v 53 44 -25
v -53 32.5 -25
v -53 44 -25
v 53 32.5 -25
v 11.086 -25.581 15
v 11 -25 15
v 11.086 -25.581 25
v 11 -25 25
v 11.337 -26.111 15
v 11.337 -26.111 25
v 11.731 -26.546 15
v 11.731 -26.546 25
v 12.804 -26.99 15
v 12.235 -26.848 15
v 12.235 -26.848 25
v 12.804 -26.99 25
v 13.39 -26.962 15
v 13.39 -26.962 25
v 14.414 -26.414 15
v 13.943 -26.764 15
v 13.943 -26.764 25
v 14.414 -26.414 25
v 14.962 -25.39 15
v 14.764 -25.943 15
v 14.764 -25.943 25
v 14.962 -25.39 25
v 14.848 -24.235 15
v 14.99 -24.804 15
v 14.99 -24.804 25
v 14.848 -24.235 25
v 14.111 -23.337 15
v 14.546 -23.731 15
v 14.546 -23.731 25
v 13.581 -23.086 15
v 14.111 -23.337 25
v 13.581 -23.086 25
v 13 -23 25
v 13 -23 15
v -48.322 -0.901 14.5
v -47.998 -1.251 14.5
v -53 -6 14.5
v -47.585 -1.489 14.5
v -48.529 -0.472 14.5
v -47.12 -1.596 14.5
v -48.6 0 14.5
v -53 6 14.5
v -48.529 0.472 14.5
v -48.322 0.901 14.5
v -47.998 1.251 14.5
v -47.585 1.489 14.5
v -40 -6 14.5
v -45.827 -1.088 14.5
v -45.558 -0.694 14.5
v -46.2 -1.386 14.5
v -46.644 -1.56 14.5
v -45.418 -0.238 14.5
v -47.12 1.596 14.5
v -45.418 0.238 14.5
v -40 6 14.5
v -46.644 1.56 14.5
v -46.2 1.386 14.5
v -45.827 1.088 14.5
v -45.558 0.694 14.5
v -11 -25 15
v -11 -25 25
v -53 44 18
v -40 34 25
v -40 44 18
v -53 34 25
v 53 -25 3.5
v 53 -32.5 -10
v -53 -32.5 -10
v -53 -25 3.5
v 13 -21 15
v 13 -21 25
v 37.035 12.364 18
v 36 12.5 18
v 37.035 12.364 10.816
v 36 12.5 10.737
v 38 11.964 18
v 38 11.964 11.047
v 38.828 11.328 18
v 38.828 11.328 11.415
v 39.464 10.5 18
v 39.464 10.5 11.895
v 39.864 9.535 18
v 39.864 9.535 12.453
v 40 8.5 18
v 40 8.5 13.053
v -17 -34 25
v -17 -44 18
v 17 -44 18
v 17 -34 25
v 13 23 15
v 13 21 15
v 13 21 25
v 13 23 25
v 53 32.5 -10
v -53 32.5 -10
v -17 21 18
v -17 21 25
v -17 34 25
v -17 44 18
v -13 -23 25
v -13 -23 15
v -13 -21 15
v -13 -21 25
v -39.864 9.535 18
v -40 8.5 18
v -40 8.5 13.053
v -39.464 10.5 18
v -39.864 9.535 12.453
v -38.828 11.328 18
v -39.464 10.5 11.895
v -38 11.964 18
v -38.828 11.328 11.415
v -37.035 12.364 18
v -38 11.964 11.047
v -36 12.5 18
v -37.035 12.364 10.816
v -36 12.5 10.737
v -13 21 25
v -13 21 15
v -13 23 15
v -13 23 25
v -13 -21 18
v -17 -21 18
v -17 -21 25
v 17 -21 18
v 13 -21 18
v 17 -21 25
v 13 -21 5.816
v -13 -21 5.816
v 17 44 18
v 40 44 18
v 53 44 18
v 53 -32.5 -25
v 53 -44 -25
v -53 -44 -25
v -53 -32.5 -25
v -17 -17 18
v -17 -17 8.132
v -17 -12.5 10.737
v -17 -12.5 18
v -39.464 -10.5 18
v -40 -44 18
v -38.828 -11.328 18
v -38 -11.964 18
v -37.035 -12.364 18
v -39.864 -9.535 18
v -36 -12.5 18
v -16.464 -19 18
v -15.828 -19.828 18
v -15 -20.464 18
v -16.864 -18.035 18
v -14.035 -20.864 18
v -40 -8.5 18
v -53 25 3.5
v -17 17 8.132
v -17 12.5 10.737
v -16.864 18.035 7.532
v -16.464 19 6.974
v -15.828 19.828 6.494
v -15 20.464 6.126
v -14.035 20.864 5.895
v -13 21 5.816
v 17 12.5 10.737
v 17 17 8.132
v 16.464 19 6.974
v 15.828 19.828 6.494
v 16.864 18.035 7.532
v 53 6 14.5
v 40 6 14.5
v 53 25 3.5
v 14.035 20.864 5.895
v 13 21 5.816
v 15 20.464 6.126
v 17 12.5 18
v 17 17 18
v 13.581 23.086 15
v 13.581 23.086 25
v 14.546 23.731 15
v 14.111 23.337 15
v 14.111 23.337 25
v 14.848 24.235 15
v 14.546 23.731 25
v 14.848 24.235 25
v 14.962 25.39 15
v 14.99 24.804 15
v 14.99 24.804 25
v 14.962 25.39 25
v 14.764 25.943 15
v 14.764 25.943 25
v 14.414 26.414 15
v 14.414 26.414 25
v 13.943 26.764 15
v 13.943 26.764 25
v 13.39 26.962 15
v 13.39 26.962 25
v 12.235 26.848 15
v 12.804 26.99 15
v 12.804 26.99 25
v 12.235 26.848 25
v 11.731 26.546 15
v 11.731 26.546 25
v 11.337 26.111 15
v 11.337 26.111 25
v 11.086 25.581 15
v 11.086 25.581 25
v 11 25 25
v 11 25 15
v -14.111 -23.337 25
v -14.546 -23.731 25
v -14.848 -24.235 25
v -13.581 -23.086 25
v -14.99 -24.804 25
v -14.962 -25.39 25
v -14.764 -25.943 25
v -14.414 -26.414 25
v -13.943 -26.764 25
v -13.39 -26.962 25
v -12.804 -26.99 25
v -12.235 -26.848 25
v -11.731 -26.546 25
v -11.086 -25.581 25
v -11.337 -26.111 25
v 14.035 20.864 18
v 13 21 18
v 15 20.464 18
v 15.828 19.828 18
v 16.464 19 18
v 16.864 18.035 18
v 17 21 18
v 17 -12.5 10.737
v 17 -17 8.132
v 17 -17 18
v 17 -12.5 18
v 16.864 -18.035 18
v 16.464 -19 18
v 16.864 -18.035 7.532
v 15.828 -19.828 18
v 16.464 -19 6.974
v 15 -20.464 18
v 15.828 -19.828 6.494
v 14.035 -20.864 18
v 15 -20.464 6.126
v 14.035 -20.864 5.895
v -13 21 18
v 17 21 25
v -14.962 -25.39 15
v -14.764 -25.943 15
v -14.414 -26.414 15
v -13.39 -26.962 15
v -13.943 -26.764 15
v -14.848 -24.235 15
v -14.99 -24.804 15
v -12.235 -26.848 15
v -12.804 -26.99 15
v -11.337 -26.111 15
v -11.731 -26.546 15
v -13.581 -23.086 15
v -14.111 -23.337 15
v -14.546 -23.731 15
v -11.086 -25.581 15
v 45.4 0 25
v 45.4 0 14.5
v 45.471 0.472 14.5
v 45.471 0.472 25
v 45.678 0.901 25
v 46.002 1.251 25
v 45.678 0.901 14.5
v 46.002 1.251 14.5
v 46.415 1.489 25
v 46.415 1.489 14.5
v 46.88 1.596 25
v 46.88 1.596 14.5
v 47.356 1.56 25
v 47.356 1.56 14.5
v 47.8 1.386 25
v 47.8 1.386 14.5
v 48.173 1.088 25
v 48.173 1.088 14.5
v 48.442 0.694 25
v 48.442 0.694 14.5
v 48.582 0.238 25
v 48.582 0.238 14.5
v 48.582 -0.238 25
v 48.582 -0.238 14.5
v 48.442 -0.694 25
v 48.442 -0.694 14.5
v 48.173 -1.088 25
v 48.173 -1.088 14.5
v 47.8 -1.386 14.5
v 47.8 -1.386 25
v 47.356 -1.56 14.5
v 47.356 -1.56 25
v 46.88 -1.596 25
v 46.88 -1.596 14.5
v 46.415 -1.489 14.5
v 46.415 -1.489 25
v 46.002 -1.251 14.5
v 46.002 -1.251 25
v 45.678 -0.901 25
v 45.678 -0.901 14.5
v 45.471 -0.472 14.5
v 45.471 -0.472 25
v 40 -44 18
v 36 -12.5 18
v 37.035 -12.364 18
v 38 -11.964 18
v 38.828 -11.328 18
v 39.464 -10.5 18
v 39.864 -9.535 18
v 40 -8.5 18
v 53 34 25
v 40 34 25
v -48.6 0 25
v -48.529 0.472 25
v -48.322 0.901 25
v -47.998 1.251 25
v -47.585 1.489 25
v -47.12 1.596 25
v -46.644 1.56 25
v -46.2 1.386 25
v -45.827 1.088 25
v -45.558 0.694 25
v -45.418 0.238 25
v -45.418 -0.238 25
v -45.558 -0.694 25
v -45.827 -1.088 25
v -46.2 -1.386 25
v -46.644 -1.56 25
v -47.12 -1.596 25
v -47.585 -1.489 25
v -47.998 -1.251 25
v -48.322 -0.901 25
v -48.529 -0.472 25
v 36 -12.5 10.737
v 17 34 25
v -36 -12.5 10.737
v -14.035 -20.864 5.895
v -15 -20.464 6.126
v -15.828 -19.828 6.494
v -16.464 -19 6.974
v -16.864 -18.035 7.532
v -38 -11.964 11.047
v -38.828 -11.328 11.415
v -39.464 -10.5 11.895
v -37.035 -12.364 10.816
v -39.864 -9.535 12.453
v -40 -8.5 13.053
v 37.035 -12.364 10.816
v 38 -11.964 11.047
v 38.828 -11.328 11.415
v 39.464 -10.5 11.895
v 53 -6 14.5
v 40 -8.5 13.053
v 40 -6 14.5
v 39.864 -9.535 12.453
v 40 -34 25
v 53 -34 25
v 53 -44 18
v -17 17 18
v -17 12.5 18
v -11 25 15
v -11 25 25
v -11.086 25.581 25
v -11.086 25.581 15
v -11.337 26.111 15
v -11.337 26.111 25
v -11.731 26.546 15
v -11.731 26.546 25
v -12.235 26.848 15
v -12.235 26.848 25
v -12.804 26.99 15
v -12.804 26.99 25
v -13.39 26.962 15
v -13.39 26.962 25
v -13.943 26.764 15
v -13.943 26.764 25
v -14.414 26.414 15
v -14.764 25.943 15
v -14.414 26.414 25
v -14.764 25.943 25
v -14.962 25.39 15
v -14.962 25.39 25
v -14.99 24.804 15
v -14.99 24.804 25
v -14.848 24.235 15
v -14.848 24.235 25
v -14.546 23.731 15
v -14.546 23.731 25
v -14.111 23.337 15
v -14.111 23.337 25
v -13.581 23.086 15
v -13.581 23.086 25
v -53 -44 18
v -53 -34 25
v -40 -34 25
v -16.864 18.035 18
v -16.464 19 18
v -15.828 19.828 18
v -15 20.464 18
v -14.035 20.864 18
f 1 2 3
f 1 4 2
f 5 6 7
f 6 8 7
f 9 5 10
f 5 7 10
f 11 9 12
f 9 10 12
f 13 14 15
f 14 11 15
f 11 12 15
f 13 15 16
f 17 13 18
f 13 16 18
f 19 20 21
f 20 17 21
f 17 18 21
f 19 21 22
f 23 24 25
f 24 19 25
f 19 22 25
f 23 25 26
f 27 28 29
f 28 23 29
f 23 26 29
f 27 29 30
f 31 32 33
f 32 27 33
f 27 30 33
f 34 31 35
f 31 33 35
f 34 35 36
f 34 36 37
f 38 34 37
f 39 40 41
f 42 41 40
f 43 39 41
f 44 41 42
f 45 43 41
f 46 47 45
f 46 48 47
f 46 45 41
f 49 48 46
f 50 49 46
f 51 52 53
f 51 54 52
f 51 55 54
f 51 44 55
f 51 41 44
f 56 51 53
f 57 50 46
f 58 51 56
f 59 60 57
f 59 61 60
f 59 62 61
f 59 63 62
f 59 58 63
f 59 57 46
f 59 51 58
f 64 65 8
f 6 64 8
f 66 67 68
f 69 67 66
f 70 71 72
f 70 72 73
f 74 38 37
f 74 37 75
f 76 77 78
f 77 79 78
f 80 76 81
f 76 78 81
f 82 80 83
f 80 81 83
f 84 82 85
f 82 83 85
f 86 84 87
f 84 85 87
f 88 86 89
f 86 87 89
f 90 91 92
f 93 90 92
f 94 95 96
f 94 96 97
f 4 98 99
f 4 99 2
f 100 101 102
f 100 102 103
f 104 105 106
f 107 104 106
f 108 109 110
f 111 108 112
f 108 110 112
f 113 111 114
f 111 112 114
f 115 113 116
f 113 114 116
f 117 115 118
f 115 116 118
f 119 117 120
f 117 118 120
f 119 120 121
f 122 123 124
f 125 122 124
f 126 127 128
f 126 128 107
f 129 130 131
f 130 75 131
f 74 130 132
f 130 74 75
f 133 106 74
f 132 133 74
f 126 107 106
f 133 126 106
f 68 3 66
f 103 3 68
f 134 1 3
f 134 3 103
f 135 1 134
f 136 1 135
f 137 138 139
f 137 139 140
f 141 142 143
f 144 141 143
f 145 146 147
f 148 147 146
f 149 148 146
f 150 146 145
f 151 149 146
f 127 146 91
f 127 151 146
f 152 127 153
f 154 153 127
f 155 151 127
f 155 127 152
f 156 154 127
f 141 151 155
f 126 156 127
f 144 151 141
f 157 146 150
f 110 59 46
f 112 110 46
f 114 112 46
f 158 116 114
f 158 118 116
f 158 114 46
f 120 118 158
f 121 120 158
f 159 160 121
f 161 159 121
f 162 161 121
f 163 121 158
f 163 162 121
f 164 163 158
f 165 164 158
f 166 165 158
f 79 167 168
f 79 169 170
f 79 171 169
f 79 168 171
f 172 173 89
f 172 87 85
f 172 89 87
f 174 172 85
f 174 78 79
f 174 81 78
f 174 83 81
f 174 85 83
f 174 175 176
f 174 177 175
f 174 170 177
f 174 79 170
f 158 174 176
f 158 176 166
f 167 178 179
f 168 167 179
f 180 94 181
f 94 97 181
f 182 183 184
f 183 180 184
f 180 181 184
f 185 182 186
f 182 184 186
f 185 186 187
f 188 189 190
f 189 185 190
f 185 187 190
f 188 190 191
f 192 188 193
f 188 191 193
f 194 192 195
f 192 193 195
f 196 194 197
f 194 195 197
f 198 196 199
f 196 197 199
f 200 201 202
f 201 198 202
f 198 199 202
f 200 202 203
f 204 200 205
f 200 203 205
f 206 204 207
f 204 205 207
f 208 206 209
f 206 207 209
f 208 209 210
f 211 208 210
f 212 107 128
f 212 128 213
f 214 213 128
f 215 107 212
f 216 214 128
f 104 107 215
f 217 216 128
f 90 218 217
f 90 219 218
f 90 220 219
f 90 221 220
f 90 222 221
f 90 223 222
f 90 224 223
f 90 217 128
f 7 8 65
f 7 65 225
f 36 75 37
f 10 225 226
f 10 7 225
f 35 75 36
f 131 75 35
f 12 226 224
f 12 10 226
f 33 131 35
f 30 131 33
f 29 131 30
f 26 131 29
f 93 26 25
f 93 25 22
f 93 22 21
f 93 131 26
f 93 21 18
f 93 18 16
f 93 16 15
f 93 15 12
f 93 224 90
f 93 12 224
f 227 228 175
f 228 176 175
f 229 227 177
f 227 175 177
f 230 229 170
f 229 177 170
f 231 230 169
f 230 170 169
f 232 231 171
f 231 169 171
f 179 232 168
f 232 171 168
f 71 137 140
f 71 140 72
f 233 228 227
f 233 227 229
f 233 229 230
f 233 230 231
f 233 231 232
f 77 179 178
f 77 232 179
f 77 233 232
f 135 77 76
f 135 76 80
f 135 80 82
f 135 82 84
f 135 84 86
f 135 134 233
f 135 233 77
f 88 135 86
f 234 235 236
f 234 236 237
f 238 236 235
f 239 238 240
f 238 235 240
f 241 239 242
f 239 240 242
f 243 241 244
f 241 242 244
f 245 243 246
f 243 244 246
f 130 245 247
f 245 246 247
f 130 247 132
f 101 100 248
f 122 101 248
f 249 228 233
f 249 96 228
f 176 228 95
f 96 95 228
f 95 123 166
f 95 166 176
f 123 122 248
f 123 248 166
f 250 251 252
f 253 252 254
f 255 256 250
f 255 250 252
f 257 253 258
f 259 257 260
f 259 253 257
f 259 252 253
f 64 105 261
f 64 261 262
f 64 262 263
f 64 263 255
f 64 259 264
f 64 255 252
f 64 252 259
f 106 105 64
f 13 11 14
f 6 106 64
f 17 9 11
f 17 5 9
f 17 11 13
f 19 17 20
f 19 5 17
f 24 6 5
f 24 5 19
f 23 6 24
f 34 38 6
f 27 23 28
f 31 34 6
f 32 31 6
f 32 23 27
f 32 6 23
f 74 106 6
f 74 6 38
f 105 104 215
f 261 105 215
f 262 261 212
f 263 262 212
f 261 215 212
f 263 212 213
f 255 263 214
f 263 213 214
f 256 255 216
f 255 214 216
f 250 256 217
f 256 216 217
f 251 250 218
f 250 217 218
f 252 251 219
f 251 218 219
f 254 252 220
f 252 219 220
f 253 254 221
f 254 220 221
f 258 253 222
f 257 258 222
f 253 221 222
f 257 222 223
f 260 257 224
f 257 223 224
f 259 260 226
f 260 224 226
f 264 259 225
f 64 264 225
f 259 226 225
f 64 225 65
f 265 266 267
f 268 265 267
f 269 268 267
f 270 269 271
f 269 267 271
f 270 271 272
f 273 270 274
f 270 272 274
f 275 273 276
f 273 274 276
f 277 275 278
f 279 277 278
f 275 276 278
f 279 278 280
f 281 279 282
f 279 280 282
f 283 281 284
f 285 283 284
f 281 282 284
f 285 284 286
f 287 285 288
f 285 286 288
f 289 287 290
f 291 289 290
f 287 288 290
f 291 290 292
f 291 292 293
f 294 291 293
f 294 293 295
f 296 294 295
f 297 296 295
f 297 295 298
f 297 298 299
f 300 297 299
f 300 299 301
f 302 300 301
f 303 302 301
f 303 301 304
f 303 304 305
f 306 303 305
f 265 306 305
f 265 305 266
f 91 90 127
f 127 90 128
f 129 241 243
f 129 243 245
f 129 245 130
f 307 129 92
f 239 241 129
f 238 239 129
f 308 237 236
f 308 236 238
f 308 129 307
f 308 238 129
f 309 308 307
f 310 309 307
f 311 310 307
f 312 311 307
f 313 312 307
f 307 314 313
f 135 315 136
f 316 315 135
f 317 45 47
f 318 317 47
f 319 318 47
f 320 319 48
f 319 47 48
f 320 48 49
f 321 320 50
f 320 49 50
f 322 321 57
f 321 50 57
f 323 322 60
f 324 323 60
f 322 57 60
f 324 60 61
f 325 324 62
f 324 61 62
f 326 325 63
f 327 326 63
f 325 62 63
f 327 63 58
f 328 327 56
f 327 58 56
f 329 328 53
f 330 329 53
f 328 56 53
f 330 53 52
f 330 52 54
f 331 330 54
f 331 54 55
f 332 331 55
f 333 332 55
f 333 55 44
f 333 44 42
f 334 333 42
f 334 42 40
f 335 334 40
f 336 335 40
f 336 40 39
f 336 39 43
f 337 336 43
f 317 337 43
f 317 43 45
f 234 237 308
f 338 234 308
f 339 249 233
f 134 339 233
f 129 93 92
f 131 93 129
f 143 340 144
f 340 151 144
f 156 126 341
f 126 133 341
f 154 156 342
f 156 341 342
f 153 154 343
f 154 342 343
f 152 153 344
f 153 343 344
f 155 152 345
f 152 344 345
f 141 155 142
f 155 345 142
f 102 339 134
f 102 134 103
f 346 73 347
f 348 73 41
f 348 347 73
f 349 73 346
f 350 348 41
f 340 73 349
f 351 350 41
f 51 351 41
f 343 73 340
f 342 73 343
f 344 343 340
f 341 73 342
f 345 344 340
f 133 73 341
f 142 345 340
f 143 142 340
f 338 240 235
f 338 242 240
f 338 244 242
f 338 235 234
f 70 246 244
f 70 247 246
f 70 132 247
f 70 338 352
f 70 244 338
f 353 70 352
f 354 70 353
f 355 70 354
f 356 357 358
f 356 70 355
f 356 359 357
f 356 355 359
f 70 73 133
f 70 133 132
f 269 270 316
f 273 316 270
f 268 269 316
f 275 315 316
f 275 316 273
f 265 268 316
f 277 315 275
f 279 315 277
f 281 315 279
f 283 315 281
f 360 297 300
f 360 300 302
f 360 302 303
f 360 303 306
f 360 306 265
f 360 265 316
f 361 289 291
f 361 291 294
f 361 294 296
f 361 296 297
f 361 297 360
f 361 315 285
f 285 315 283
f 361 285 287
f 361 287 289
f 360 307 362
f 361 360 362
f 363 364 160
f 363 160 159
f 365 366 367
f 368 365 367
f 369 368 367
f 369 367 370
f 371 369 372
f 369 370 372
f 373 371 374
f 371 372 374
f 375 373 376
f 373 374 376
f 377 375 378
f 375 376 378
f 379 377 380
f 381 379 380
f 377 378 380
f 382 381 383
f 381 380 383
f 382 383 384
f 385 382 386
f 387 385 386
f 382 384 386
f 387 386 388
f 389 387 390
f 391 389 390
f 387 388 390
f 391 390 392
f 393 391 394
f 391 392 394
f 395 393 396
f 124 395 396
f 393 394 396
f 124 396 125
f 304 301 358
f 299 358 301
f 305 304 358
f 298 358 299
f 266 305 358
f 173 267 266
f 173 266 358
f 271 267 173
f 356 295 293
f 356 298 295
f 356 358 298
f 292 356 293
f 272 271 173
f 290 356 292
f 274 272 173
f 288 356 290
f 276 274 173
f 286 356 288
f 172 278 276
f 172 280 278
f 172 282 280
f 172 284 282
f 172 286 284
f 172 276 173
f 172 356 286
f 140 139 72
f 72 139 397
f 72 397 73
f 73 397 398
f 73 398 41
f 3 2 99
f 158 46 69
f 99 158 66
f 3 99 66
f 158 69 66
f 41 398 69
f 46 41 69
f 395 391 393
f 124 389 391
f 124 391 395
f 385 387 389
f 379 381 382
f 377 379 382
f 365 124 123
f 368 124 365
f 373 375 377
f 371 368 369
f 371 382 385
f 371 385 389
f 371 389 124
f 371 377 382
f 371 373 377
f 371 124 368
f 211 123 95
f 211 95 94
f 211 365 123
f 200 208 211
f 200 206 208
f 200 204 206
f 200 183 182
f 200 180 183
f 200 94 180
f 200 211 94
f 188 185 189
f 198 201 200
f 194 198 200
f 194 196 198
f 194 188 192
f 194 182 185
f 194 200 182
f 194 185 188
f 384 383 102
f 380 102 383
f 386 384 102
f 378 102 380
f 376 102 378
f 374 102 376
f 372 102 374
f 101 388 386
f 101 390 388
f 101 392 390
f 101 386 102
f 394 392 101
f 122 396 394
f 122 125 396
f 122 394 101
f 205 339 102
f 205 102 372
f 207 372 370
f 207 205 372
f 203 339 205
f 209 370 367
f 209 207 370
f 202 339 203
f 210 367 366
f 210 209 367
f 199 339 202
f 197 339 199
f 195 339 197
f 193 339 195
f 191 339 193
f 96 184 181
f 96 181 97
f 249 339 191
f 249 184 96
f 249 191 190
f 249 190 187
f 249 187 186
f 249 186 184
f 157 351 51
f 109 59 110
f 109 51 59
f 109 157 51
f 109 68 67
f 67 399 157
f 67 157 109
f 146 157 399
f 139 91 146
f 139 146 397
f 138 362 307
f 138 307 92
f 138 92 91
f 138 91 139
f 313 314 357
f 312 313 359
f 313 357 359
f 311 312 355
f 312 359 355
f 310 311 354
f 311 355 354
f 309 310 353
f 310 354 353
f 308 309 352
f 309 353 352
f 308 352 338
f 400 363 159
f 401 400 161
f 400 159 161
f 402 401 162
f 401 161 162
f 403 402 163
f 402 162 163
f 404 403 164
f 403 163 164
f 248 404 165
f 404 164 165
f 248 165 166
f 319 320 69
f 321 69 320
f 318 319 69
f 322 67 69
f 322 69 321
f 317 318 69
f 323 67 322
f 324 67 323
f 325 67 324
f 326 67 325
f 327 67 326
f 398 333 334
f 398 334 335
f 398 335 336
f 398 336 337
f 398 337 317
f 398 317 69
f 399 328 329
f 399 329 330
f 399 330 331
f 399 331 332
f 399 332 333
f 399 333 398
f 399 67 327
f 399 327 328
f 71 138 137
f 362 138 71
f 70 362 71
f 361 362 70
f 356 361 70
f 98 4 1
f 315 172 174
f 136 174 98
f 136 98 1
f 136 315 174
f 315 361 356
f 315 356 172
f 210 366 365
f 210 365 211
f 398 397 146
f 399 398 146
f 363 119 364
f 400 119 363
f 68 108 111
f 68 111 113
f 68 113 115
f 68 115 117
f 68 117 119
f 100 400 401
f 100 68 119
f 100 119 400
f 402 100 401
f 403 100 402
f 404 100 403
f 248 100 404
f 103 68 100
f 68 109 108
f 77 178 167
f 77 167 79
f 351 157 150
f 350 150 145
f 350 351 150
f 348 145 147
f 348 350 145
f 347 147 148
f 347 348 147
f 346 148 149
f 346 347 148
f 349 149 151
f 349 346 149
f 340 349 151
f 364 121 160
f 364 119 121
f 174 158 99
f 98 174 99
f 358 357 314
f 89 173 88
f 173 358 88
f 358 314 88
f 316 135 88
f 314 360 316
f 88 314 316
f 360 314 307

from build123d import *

# Parameters (mm, degrees)
F1_DEPTH  = 53
F2_W      = 80
F2_H      = 25
F3_DEPTH  = 25
F4_W      = 23
F4_H      = 115.9437634051
F5_DEPTH  = 7
F6_W      = 34
F6_H      = 8.5
F7_DEPTH  = 50.001
F8_W      = 26
F8_H      = 4
F9_DEPTH  = 10
F10_R     = 2
F11_DEPTH = 10
F12_SIZE2 = 7
F12_SIZE  = 10
F13_SIZE2 = 10
F13_SIZE  = 7
F15_D     = 3.2
F15_DEPTH = 12
F15_TIP   = 0.9613769904
F16_R     = 3.99999


# Not quite as in the source:
# - a fillet or chamfer is up to 0.001 mm smaller than in the source, because OpenCascade refuses the exact size


with BuildPart() as f1:
    # F0 (on Right) → F1 (new body, symmetric)
    with BuildSketch(Plane.YZ):
        Polygon((44, 25), (-44, 25), (-44, -25), (-32.5, -25), (-32.5, -10), (-25, 3.5), (-6, 14.5), (0, 14.5), (6, 14.5), (25, 3.5), (32.5, -10), (32.5, -25), (44, -25), align=None)
    extrude(amount=F1_DEPTH, both=True)

    # F2 (on face) → F3 (cut)
    with BuildSketch(Plane.XY.offset(25)):
        Rectangle(F2_W, F2_H)
    extrude(amount=-F3_DEPTH, mode=Mode.SUBTRACT)

    # F4 (on face) → F5 (cut)
    with BuildSketch(Plane.XY.offset(25)):
        with Locations((-28.5, -2.7361307293)):
            Rectangle(F4_W, F4_H)
        with Locations((28.5, -2.7361307293)):
            Rectangle(F4_W, F4_H)
    extrude(amount=-F5_DEPTH, mode=Mode.SUBTRACT)

    # F6 (on face) → F7 (cut, through all)
    with BuildSketch(Plane.XY.offset(25)):
        with Locations((0, 16.75)):
            Rectangle(F6_W, F6_H)
        with Locations((0, -16.75)):
            Rectangle(F6_W, F6_H)
    extrude(amount=-F7_DEPTH, mode=Mode.SUBTRACT)

    # F8 (on face) → F9 (cut)
    with BuildSketch(Plane.XY.offset(25)):
        with Locations((0, 23)):
            Rectangle(F8_W, F8_H)
        with Locations((0, -23)):
            Rectangle(F8_W, F8_H)
    extrude(amount=-F9_DEPTH, mode=Mode.SUBTRACT)

    # F10 (on face) → F11 (cut)
    with BuildSketch(Plane.XY.offset(25)):
        with Locations((-13, 25)):
            Circle(F10_R)
        with Locations((13, 25)):
            Circle(F10_R)
        with Locations((-13, -25)):
            Circle(F10_R)
        with Locations((13, -25)):
            Circle(F10_R)
    extrude(amount=-F11_DEPTH, mode=Mode.SUBTRACT)

    # F12
    f12_edges = [f1.edges().sort_by_distance(p)[0] for p in [
        (-46.5, -44, 25),
        (0, -44, 25),
        (46.5, -44, 25),
    ]]
    chamfer(f12_edges, length=F12_SIZE, length2=F12_SIZE2)

    # F13
    f13_edges = [f1.edges().sort_by_distance(p)[0] for p in [
        (-46.5, 44, 25),
        (0, 44, 25),
        (46.5, 44, 25),
    ]]
    f13_side = f1.faces().sort_by_distance((0, 44, -1.390719))[0]
    chamfer(f13_edges, length=F13_SIZE, length2=F13_SIZE2, reference=f13_side)

    # F15
    with Locations(Plane.XY.offset(25)):
        with Locations((-47, 0), (47, 0)):
            Hole(F15_D / 2, depth=F15_DEPTH)
            with Locations((0, 0, -(F15_DEPTH + F15_TIP / 2))):  # 118° drill point
                Cone(0, F15_D / 2, F15_TIP, mode=Mode.SUBTRACT)

    # F16 (radius 4 in the source; OpenCascade refuses exactly that, so slightly less here)
    f16_edges = [f1.edges().sort_by_distance(p)[0] for p in [
        (17, 21, 11.907895),
        (-17, 21, 11.907895),
        (-40, 12.5, 14.368421),
        (-40, -12.5, 14.368421),
        (-17, -21, 11.907895),
        (17, -21, 11.907895),
        (40, -12.5, 14.368421),
        (40, 12.5, 14.368421),
    ]]
    fillet(f16_edges, radius=F16_R)


solid = f1.part
